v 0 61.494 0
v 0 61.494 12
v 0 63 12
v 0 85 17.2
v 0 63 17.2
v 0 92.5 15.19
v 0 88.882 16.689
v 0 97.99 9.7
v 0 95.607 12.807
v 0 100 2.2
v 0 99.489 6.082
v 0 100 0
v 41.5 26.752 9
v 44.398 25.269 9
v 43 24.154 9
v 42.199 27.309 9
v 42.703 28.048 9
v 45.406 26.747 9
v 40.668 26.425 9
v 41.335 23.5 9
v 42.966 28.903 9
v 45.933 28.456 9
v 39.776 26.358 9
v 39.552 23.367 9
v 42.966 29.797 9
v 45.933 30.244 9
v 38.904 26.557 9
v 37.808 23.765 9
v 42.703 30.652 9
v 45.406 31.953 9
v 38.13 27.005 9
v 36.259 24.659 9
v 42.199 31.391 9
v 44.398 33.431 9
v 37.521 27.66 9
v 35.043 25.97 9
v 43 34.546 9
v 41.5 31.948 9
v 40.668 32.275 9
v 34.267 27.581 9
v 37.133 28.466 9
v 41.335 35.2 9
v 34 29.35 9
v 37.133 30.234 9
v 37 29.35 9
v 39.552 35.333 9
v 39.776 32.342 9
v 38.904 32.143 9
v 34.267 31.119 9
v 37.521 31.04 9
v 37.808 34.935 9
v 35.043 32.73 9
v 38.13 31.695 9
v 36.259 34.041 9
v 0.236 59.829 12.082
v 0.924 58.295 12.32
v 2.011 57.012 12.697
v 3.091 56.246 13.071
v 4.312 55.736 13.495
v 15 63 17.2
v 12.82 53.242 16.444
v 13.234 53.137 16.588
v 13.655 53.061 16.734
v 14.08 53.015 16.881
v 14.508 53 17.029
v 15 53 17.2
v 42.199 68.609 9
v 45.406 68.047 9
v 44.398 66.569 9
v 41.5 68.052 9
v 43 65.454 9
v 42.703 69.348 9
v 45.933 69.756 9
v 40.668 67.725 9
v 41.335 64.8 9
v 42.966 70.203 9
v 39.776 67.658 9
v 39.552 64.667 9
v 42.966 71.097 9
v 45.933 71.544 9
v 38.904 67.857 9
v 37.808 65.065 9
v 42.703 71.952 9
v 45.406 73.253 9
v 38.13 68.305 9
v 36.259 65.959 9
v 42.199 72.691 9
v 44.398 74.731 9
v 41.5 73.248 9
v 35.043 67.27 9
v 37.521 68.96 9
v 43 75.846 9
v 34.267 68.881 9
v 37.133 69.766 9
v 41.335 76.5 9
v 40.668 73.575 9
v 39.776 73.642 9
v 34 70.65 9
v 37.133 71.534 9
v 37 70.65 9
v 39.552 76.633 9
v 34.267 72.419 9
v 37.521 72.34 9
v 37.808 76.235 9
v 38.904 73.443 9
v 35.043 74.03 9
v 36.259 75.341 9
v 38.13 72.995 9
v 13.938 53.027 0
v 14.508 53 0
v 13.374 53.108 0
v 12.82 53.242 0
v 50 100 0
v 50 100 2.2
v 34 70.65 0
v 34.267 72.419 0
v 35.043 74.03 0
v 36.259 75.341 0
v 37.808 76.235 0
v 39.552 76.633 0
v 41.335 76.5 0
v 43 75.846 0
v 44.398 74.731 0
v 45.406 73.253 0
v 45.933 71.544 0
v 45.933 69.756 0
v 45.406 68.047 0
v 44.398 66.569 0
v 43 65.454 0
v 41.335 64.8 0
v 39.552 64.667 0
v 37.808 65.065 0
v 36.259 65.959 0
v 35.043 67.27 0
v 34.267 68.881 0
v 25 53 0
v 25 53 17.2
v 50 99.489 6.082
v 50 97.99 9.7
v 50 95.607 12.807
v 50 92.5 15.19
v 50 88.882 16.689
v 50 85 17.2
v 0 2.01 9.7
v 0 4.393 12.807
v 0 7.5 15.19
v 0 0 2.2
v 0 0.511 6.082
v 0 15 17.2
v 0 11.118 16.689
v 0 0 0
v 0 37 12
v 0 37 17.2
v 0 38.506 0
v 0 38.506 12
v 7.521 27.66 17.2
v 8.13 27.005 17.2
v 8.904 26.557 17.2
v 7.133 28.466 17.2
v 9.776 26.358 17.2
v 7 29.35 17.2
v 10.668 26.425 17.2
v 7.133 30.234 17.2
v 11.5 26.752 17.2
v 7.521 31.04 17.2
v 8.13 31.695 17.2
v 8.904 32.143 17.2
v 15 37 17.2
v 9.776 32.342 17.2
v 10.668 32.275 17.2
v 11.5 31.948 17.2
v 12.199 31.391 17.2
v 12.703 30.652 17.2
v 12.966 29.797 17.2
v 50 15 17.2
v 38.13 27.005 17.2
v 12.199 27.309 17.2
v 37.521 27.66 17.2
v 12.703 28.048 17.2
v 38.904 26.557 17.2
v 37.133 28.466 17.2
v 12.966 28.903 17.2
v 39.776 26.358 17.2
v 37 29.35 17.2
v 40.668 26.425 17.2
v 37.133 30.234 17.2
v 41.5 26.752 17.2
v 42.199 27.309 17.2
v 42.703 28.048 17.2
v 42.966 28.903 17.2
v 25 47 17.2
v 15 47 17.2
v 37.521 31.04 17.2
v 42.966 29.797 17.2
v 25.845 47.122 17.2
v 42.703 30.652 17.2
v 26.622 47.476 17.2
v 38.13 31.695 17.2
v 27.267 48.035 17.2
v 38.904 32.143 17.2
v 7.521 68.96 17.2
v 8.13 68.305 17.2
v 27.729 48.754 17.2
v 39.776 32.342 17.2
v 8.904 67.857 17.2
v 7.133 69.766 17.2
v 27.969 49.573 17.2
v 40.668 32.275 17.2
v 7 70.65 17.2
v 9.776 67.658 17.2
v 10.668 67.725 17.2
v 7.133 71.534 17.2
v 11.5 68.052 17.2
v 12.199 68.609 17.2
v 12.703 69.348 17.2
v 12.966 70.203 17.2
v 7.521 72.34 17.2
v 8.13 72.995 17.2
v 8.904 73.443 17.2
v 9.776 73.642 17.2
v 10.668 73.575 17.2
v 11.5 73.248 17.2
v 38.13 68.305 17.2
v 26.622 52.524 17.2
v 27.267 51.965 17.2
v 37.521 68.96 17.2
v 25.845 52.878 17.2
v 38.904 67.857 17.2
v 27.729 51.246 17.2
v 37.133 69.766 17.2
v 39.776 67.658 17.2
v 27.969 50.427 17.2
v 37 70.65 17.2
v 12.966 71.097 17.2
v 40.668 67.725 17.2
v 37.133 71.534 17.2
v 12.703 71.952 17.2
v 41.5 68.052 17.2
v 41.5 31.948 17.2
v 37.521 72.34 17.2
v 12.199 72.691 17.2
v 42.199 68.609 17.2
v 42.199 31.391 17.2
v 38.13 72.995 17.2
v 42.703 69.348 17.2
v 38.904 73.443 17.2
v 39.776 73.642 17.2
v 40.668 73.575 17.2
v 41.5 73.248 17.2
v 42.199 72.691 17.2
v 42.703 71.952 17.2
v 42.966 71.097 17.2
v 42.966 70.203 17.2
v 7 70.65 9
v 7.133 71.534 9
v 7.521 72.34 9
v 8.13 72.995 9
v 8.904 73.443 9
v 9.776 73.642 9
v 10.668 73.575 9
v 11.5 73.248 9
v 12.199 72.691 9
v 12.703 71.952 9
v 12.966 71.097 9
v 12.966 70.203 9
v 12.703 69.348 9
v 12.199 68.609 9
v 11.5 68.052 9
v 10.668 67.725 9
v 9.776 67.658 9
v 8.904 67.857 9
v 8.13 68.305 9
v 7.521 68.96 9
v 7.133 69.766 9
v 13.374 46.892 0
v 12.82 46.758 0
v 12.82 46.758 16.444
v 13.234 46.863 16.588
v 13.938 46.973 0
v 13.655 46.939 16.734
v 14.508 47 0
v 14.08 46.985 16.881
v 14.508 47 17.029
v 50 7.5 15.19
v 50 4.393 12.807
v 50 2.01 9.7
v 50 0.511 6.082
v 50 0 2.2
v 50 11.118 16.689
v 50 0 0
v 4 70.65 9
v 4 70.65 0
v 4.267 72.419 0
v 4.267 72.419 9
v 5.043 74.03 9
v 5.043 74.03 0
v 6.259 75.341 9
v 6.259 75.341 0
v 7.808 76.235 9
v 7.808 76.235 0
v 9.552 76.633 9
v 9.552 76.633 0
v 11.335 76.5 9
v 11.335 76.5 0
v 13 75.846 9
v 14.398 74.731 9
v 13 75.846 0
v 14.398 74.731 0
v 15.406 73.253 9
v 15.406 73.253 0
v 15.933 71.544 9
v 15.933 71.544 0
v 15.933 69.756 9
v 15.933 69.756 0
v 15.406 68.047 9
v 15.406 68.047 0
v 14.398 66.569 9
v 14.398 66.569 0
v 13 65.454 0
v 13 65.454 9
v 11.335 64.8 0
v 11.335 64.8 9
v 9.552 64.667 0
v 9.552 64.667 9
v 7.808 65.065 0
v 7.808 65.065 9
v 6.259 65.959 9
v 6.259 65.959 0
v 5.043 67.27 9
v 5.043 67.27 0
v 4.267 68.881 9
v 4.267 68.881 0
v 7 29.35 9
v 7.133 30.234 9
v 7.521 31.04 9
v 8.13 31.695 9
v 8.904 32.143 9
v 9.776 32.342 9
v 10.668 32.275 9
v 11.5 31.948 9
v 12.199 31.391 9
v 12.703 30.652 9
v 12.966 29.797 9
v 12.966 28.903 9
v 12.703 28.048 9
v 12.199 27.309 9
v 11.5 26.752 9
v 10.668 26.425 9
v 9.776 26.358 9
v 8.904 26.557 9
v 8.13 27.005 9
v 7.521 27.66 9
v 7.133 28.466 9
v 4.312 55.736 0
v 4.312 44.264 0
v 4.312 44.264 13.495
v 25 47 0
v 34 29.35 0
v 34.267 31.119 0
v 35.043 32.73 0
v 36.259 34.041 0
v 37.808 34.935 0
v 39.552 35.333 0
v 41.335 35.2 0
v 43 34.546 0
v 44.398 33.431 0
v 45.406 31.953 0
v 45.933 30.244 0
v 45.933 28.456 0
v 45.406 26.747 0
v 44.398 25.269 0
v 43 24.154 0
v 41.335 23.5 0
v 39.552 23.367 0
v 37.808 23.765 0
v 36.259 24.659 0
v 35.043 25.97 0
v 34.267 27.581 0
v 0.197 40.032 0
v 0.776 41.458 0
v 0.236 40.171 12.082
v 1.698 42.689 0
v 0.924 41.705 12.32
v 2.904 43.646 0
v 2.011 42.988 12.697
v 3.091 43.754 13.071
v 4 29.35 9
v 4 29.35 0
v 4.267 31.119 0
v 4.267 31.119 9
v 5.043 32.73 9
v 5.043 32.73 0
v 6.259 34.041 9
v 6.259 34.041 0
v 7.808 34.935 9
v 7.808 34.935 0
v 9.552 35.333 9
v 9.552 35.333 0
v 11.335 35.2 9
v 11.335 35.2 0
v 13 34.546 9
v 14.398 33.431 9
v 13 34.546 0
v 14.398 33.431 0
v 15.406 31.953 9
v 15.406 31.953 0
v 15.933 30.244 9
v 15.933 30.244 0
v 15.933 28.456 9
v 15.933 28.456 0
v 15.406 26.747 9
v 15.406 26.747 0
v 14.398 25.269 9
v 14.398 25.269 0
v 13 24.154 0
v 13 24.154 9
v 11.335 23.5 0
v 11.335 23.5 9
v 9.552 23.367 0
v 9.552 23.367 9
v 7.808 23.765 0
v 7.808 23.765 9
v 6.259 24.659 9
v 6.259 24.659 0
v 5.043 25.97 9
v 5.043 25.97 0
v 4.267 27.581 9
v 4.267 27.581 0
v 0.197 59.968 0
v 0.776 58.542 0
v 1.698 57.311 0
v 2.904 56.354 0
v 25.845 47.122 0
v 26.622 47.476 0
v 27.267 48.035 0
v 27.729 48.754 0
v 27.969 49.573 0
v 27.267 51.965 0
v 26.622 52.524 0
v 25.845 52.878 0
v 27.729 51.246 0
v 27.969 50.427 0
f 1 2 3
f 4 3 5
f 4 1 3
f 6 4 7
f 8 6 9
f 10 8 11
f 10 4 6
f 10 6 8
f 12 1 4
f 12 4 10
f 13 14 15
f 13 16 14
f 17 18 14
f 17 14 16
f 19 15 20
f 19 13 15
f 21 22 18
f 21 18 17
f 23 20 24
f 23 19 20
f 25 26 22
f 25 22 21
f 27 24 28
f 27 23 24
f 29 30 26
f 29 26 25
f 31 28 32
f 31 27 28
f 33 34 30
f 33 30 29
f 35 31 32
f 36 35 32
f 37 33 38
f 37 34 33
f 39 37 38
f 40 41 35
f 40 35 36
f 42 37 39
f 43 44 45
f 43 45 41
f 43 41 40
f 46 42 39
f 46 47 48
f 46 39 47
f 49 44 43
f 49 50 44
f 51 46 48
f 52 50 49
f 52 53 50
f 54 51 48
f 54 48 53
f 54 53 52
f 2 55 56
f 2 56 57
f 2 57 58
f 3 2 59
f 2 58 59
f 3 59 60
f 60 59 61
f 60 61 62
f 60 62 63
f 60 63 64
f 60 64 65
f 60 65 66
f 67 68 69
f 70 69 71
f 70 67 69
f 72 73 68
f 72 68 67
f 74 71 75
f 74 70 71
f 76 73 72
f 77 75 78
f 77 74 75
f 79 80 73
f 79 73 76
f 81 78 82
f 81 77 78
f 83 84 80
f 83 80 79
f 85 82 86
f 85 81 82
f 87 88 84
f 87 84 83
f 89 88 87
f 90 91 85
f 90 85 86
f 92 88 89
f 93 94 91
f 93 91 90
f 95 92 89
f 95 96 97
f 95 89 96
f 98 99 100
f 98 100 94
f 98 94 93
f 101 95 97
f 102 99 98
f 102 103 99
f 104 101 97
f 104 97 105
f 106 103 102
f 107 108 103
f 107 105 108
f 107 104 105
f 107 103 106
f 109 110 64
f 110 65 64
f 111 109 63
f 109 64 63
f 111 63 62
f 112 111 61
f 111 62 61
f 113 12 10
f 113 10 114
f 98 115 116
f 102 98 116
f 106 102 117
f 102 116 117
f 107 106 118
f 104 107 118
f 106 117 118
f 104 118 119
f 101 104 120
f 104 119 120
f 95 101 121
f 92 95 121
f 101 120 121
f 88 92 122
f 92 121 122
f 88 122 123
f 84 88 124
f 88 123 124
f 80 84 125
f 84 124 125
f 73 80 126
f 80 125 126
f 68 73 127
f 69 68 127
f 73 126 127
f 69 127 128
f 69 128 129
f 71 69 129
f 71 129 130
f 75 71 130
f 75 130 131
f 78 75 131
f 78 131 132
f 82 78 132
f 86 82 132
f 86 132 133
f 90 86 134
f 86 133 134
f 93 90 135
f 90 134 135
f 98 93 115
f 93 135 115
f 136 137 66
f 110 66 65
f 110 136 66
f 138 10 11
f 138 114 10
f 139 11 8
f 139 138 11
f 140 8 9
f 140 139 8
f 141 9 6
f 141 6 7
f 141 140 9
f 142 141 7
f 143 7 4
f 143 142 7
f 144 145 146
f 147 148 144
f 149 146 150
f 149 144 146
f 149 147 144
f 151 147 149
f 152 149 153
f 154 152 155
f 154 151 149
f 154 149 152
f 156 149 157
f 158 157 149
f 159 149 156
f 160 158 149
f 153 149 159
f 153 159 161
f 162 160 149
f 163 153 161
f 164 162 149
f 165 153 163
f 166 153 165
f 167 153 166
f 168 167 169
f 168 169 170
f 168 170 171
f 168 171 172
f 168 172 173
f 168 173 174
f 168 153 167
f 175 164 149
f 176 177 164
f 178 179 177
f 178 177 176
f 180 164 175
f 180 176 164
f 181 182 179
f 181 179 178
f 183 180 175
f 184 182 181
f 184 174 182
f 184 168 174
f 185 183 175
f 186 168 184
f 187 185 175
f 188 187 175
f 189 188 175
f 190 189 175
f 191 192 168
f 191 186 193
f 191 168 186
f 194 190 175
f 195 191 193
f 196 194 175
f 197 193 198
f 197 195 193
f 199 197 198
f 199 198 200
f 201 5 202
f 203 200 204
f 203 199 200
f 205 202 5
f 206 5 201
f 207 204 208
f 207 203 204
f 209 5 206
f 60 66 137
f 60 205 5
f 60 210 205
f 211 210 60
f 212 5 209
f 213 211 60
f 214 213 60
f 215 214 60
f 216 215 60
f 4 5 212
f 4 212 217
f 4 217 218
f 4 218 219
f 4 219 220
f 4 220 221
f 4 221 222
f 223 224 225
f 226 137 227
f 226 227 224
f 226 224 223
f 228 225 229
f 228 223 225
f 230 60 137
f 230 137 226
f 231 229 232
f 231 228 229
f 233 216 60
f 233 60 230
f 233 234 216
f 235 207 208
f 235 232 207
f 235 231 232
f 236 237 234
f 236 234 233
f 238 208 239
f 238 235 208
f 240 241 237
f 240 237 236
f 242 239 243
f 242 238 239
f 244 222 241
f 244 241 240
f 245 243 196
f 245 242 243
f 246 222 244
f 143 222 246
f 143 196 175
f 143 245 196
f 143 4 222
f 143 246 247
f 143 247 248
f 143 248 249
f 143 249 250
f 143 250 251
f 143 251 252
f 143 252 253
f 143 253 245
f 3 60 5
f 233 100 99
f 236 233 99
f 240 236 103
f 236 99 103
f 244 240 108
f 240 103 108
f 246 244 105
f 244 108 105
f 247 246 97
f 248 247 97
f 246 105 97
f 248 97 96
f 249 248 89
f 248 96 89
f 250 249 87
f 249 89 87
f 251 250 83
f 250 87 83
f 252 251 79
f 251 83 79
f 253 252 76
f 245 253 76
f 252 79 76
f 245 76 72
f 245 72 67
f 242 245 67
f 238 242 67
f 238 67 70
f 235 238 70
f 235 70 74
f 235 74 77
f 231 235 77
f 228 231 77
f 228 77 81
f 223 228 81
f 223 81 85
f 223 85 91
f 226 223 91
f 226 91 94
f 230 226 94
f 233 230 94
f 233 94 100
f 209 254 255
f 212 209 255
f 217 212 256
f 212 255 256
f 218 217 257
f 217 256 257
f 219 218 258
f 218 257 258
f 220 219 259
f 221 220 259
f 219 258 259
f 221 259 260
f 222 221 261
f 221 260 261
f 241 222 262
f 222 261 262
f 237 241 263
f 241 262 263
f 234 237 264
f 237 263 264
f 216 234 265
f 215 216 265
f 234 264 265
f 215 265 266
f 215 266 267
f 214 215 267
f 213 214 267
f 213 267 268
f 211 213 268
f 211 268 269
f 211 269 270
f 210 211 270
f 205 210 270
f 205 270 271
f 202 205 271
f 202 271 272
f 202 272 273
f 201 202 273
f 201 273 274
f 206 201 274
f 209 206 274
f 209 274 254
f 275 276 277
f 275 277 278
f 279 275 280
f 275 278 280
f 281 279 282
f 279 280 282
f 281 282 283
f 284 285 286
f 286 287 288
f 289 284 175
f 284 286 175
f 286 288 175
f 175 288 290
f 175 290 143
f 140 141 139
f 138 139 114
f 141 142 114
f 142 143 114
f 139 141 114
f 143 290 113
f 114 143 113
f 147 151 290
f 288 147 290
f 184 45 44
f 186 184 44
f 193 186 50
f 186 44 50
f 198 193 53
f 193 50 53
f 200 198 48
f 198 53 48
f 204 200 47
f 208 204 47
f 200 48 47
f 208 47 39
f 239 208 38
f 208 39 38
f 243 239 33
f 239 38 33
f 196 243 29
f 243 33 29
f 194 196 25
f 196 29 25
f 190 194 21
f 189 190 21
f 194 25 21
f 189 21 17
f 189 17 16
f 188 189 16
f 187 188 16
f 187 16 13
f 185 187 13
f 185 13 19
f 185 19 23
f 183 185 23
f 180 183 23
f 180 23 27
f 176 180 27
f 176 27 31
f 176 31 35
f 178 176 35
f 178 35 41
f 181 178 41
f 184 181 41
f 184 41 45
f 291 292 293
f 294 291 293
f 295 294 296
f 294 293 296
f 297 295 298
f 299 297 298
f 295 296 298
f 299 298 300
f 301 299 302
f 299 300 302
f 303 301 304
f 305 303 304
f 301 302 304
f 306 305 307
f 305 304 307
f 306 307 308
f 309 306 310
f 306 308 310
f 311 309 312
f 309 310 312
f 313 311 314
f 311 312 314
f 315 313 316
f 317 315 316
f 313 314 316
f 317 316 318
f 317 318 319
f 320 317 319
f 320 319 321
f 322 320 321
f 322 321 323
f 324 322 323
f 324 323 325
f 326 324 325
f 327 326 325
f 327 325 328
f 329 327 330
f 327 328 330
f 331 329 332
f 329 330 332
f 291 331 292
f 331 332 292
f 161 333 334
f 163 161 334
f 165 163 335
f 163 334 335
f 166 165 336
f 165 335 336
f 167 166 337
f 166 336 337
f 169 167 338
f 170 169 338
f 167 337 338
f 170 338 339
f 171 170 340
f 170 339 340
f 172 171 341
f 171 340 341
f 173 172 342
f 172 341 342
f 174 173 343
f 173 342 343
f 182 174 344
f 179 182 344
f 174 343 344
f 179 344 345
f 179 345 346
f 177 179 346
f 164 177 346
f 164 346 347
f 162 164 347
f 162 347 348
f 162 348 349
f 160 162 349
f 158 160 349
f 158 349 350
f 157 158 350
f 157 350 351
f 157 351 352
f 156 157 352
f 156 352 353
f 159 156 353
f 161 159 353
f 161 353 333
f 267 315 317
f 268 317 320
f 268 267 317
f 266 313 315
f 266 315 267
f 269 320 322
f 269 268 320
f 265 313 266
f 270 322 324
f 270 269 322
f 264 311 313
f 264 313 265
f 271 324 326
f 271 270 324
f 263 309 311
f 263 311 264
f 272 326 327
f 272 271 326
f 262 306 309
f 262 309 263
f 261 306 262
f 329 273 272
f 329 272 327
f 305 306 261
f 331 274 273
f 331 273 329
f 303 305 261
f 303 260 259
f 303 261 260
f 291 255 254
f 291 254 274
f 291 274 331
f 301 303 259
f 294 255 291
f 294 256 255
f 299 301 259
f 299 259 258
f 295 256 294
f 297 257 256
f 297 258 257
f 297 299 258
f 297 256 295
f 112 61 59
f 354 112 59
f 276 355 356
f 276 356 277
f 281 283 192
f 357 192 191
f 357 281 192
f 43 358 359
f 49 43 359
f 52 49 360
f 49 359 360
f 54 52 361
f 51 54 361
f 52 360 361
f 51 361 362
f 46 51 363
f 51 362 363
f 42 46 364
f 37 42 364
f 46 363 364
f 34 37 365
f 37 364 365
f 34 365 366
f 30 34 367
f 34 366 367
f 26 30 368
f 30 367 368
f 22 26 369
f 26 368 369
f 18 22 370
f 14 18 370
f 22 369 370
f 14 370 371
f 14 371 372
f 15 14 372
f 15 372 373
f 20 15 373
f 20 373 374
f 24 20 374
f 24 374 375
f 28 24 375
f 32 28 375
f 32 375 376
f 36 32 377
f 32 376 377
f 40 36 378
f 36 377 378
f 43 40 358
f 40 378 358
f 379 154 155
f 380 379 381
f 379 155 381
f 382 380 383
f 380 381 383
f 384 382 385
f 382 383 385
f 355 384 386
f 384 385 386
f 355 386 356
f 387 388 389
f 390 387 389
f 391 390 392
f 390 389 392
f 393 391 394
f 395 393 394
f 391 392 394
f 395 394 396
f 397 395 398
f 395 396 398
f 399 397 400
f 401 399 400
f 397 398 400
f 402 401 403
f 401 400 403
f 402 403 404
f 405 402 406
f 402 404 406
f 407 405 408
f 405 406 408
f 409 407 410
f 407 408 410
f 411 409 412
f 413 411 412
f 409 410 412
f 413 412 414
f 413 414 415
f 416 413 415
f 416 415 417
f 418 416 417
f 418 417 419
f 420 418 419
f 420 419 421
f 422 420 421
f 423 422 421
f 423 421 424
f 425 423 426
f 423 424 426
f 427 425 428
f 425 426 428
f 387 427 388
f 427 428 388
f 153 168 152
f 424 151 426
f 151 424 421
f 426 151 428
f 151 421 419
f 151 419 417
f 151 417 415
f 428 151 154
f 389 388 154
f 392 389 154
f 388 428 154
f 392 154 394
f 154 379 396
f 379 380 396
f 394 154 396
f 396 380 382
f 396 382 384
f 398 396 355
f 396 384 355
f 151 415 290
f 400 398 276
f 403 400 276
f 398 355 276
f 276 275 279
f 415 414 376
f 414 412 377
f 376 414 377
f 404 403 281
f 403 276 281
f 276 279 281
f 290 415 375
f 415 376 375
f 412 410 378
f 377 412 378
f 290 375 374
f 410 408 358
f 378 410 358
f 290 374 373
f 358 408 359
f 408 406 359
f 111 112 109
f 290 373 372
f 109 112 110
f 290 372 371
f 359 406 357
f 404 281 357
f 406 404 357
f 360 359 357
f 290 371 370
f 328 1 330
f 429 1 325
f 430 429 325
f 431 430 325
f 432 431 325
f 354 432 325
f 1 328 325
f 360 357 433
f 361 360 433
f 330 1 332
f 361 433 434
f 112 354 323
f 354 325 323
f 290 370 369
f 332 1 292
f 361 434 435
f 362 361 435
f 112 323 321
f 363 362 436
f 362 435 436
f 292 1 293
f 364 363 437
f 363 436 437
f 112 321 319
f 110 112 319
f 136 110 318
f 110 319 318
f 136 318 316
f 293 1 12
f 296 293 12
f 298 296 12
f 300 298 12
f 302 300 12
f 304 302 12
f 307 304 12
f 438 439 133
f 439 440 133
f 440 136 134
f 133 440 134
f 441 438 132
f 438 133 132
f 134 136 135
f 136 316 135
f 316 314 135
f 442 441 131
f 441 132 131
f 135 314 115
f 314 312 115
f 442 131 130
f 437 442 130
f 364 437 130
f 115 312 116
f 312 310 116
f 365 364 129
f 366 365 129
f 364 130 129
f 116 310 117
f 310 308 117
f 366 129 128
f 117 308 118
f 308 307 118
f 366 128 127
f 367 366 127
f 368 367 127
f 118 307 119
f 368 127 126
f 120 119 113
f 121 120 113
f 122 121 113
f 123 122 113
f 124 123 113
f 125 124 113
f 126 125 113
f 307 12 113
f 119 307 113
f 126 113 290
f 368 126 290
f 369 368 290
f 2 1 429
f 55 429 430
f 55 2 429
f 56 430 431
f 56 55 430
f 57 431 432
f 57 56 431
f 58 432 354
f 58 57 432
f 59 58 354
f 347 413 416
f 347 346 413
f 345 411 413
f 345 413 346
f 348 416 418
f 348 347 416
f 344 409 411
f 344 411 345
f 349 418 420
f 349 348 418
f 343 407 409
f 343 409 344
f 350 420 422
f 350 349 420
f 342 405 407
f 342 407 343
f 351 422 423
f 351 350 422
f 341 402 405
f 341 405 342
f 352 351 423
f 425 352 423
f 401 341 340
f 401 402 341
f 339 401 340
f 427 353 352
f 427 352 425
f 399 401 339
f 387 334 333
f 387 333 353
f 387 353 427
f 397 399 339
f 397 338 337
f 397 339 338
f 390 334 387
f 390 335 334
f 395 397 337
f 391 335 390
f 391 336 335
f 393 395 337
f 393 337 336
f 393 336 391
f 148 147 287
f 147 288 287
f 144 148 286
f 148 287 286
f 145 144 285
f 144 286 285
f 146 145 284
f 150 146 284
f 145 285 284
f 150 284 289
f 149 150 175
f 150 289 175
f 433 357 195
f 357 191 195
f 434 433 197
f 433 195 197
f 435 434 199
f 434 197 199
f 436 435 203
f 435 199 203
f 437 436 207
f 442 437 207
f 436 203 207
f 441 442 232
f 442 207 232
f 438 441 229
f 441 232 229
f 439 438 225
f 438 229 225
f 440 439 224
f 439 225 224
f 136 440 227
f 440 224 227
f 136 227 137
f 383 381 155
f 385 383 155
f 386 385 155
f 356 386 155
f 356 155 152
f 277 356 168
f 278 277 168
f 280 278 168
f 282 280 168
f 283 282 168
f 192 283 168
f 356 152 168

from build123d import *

# Parameters (mm, degrees)
SKETCH_1_W          = 50
SKETCH_1_H          = 100
EXTRUDE_1_DEPTH     = 17.2
FILLET_1_R          = 15
CUT_EXTRUDE_3_DEPTH = 26
SKETCH_6_R          = 3
CUT_EXTRUDE_4_DEPTH = 114.11869872
CUT_EXTRUDE_5_DEPTH = 114.11869872
FILLET_2_R          = 6
FILLET_3_R          = 6
SKETCH_9_R          = 3
CUT_EXTRUDE_6_DEPTH = 114.11869872
SKETCH_10_R         = 6
CUT_EXTRUDE_7_DEPTH = 9


with BuildPart() as part:
    # Эскиз1 → Бобышка-Вытянуть1 (new body)
    with BuildSketch(Plane.XY):
        with Locations((25, 50)):
            Rectangle(SKETCH_1_W, SKETCH_1_H)
    extrude(amount=EXTRUDE_1_DEPTH)

    # Скругление1
    fillet_1_edges = [part.edges().sort_by_distance(p)[0] for p in [
        (25, 100, 17.2),
        (25, 0, 17.2),
    ]]
    fillet(fillet_1_edges, radius=FILLET_1_R)

    # Эскиз5 → Вырез-Вытянуть3 (cut)
    with BuildSketch(Plane(origin=(0, 37, 0), x_dir=(1, 0, 0), z_dir=(0, 1, 0))):
        Polygon((0, -17.2), (0, -12), (15, -17.2), align=None)
    extrude(amount=CUT_EXTRUDE_3_DEPTH, mode=Mode.SUBTRACT)

    # Эскиз6 → Вырез-Вытянуть4 (cut, through all)
    with BuildSketch(Plane.XY.offset(17.2)):
        with Locations((25, 50)):
            Circle(SKETCH_6_R)
    extrude(amount=-CUT_EXTRUDE_4_DEPTH, mode=Mode.SUBTRACT)

    # Эскиз7 → Вырез-Вытянуть5 (cut, through all)
    with BuildSketch(Plane(origin=(0, 0, 0), x_dir=(-1, 0, 0), z_dir=(0, 0, -1))):
        Polygon((0, 57), (0, 43), (-13.646386899, 47), (-25, 47), (-25, 53), (-13.646386899, 53), align=None)
    extrude(amount=-CUT_EXTRUDE_5_DEPTH, mode=Mode.SUBTRACT)

    # Скругление2
    fillet_2_edges = [part.edges().sort_by_distance(p)[0] for p in [
        (0, 57, 6),
        (0, 43, 6),
    ]]
    fillet(fillet_2_edges, radius=FILLET_2_R)

    # Скругление3
    fillet_3_edges = [part.edges().sort_by_distance(p)[0] for p in [
        (13.646386899, 53, 8.365373729),
        (13.646386899, 47, 8.365373729),
    ]]
    fillet(fillet_3_edges, radius=FILLET_3_R)

    # Эскиз9 → Вырез-Вытянуть6 (cut, through all)
    with BuildSketch(Plane(origin=(0, 0, 0), x_dir=(-1, 0, 0), z_dir=(0, 0, -1))):
        with Locations((-40, 29.35)):
            Circle(SKETCH_9_R)
        with Locations((-10, 29.35)):
            Circle(SKETCH_9_R)
        with Locations((-10, 70.65)):
            Circle(SKETCH_9_R)
        with Locations((-40, 70.65)):
            Circle(SKETCH_9_R)
    extrude(amount=-CUT_EXTRUDE_6_DEPTH, mode=Mode.SUBTRACT)

    # Эскиз10 → Вырез-Вытянуть7 (cut)
    with BuildSketch(Plane(origin=(0, 0, 0), x_dir=(-1, 0, 0), z_dir=(0, 0, -1))):
        with Locations((-40, 29.35)):
            Circle(SKETCH_10_R)
        with Locations((-10, 29.35)):
            Circle(SKETCH_10_R)
        with Locations((-10, 70.65)):
            Circle(SKETCH_10_R)
        with Locations((-40, 70.65)):
            Circle(SKETCH_10_R)
    extrude(amount=-CUT_EXTRUDE_7_DEPTH, mode=Mode.SUBTRACT)


solid = part.part
